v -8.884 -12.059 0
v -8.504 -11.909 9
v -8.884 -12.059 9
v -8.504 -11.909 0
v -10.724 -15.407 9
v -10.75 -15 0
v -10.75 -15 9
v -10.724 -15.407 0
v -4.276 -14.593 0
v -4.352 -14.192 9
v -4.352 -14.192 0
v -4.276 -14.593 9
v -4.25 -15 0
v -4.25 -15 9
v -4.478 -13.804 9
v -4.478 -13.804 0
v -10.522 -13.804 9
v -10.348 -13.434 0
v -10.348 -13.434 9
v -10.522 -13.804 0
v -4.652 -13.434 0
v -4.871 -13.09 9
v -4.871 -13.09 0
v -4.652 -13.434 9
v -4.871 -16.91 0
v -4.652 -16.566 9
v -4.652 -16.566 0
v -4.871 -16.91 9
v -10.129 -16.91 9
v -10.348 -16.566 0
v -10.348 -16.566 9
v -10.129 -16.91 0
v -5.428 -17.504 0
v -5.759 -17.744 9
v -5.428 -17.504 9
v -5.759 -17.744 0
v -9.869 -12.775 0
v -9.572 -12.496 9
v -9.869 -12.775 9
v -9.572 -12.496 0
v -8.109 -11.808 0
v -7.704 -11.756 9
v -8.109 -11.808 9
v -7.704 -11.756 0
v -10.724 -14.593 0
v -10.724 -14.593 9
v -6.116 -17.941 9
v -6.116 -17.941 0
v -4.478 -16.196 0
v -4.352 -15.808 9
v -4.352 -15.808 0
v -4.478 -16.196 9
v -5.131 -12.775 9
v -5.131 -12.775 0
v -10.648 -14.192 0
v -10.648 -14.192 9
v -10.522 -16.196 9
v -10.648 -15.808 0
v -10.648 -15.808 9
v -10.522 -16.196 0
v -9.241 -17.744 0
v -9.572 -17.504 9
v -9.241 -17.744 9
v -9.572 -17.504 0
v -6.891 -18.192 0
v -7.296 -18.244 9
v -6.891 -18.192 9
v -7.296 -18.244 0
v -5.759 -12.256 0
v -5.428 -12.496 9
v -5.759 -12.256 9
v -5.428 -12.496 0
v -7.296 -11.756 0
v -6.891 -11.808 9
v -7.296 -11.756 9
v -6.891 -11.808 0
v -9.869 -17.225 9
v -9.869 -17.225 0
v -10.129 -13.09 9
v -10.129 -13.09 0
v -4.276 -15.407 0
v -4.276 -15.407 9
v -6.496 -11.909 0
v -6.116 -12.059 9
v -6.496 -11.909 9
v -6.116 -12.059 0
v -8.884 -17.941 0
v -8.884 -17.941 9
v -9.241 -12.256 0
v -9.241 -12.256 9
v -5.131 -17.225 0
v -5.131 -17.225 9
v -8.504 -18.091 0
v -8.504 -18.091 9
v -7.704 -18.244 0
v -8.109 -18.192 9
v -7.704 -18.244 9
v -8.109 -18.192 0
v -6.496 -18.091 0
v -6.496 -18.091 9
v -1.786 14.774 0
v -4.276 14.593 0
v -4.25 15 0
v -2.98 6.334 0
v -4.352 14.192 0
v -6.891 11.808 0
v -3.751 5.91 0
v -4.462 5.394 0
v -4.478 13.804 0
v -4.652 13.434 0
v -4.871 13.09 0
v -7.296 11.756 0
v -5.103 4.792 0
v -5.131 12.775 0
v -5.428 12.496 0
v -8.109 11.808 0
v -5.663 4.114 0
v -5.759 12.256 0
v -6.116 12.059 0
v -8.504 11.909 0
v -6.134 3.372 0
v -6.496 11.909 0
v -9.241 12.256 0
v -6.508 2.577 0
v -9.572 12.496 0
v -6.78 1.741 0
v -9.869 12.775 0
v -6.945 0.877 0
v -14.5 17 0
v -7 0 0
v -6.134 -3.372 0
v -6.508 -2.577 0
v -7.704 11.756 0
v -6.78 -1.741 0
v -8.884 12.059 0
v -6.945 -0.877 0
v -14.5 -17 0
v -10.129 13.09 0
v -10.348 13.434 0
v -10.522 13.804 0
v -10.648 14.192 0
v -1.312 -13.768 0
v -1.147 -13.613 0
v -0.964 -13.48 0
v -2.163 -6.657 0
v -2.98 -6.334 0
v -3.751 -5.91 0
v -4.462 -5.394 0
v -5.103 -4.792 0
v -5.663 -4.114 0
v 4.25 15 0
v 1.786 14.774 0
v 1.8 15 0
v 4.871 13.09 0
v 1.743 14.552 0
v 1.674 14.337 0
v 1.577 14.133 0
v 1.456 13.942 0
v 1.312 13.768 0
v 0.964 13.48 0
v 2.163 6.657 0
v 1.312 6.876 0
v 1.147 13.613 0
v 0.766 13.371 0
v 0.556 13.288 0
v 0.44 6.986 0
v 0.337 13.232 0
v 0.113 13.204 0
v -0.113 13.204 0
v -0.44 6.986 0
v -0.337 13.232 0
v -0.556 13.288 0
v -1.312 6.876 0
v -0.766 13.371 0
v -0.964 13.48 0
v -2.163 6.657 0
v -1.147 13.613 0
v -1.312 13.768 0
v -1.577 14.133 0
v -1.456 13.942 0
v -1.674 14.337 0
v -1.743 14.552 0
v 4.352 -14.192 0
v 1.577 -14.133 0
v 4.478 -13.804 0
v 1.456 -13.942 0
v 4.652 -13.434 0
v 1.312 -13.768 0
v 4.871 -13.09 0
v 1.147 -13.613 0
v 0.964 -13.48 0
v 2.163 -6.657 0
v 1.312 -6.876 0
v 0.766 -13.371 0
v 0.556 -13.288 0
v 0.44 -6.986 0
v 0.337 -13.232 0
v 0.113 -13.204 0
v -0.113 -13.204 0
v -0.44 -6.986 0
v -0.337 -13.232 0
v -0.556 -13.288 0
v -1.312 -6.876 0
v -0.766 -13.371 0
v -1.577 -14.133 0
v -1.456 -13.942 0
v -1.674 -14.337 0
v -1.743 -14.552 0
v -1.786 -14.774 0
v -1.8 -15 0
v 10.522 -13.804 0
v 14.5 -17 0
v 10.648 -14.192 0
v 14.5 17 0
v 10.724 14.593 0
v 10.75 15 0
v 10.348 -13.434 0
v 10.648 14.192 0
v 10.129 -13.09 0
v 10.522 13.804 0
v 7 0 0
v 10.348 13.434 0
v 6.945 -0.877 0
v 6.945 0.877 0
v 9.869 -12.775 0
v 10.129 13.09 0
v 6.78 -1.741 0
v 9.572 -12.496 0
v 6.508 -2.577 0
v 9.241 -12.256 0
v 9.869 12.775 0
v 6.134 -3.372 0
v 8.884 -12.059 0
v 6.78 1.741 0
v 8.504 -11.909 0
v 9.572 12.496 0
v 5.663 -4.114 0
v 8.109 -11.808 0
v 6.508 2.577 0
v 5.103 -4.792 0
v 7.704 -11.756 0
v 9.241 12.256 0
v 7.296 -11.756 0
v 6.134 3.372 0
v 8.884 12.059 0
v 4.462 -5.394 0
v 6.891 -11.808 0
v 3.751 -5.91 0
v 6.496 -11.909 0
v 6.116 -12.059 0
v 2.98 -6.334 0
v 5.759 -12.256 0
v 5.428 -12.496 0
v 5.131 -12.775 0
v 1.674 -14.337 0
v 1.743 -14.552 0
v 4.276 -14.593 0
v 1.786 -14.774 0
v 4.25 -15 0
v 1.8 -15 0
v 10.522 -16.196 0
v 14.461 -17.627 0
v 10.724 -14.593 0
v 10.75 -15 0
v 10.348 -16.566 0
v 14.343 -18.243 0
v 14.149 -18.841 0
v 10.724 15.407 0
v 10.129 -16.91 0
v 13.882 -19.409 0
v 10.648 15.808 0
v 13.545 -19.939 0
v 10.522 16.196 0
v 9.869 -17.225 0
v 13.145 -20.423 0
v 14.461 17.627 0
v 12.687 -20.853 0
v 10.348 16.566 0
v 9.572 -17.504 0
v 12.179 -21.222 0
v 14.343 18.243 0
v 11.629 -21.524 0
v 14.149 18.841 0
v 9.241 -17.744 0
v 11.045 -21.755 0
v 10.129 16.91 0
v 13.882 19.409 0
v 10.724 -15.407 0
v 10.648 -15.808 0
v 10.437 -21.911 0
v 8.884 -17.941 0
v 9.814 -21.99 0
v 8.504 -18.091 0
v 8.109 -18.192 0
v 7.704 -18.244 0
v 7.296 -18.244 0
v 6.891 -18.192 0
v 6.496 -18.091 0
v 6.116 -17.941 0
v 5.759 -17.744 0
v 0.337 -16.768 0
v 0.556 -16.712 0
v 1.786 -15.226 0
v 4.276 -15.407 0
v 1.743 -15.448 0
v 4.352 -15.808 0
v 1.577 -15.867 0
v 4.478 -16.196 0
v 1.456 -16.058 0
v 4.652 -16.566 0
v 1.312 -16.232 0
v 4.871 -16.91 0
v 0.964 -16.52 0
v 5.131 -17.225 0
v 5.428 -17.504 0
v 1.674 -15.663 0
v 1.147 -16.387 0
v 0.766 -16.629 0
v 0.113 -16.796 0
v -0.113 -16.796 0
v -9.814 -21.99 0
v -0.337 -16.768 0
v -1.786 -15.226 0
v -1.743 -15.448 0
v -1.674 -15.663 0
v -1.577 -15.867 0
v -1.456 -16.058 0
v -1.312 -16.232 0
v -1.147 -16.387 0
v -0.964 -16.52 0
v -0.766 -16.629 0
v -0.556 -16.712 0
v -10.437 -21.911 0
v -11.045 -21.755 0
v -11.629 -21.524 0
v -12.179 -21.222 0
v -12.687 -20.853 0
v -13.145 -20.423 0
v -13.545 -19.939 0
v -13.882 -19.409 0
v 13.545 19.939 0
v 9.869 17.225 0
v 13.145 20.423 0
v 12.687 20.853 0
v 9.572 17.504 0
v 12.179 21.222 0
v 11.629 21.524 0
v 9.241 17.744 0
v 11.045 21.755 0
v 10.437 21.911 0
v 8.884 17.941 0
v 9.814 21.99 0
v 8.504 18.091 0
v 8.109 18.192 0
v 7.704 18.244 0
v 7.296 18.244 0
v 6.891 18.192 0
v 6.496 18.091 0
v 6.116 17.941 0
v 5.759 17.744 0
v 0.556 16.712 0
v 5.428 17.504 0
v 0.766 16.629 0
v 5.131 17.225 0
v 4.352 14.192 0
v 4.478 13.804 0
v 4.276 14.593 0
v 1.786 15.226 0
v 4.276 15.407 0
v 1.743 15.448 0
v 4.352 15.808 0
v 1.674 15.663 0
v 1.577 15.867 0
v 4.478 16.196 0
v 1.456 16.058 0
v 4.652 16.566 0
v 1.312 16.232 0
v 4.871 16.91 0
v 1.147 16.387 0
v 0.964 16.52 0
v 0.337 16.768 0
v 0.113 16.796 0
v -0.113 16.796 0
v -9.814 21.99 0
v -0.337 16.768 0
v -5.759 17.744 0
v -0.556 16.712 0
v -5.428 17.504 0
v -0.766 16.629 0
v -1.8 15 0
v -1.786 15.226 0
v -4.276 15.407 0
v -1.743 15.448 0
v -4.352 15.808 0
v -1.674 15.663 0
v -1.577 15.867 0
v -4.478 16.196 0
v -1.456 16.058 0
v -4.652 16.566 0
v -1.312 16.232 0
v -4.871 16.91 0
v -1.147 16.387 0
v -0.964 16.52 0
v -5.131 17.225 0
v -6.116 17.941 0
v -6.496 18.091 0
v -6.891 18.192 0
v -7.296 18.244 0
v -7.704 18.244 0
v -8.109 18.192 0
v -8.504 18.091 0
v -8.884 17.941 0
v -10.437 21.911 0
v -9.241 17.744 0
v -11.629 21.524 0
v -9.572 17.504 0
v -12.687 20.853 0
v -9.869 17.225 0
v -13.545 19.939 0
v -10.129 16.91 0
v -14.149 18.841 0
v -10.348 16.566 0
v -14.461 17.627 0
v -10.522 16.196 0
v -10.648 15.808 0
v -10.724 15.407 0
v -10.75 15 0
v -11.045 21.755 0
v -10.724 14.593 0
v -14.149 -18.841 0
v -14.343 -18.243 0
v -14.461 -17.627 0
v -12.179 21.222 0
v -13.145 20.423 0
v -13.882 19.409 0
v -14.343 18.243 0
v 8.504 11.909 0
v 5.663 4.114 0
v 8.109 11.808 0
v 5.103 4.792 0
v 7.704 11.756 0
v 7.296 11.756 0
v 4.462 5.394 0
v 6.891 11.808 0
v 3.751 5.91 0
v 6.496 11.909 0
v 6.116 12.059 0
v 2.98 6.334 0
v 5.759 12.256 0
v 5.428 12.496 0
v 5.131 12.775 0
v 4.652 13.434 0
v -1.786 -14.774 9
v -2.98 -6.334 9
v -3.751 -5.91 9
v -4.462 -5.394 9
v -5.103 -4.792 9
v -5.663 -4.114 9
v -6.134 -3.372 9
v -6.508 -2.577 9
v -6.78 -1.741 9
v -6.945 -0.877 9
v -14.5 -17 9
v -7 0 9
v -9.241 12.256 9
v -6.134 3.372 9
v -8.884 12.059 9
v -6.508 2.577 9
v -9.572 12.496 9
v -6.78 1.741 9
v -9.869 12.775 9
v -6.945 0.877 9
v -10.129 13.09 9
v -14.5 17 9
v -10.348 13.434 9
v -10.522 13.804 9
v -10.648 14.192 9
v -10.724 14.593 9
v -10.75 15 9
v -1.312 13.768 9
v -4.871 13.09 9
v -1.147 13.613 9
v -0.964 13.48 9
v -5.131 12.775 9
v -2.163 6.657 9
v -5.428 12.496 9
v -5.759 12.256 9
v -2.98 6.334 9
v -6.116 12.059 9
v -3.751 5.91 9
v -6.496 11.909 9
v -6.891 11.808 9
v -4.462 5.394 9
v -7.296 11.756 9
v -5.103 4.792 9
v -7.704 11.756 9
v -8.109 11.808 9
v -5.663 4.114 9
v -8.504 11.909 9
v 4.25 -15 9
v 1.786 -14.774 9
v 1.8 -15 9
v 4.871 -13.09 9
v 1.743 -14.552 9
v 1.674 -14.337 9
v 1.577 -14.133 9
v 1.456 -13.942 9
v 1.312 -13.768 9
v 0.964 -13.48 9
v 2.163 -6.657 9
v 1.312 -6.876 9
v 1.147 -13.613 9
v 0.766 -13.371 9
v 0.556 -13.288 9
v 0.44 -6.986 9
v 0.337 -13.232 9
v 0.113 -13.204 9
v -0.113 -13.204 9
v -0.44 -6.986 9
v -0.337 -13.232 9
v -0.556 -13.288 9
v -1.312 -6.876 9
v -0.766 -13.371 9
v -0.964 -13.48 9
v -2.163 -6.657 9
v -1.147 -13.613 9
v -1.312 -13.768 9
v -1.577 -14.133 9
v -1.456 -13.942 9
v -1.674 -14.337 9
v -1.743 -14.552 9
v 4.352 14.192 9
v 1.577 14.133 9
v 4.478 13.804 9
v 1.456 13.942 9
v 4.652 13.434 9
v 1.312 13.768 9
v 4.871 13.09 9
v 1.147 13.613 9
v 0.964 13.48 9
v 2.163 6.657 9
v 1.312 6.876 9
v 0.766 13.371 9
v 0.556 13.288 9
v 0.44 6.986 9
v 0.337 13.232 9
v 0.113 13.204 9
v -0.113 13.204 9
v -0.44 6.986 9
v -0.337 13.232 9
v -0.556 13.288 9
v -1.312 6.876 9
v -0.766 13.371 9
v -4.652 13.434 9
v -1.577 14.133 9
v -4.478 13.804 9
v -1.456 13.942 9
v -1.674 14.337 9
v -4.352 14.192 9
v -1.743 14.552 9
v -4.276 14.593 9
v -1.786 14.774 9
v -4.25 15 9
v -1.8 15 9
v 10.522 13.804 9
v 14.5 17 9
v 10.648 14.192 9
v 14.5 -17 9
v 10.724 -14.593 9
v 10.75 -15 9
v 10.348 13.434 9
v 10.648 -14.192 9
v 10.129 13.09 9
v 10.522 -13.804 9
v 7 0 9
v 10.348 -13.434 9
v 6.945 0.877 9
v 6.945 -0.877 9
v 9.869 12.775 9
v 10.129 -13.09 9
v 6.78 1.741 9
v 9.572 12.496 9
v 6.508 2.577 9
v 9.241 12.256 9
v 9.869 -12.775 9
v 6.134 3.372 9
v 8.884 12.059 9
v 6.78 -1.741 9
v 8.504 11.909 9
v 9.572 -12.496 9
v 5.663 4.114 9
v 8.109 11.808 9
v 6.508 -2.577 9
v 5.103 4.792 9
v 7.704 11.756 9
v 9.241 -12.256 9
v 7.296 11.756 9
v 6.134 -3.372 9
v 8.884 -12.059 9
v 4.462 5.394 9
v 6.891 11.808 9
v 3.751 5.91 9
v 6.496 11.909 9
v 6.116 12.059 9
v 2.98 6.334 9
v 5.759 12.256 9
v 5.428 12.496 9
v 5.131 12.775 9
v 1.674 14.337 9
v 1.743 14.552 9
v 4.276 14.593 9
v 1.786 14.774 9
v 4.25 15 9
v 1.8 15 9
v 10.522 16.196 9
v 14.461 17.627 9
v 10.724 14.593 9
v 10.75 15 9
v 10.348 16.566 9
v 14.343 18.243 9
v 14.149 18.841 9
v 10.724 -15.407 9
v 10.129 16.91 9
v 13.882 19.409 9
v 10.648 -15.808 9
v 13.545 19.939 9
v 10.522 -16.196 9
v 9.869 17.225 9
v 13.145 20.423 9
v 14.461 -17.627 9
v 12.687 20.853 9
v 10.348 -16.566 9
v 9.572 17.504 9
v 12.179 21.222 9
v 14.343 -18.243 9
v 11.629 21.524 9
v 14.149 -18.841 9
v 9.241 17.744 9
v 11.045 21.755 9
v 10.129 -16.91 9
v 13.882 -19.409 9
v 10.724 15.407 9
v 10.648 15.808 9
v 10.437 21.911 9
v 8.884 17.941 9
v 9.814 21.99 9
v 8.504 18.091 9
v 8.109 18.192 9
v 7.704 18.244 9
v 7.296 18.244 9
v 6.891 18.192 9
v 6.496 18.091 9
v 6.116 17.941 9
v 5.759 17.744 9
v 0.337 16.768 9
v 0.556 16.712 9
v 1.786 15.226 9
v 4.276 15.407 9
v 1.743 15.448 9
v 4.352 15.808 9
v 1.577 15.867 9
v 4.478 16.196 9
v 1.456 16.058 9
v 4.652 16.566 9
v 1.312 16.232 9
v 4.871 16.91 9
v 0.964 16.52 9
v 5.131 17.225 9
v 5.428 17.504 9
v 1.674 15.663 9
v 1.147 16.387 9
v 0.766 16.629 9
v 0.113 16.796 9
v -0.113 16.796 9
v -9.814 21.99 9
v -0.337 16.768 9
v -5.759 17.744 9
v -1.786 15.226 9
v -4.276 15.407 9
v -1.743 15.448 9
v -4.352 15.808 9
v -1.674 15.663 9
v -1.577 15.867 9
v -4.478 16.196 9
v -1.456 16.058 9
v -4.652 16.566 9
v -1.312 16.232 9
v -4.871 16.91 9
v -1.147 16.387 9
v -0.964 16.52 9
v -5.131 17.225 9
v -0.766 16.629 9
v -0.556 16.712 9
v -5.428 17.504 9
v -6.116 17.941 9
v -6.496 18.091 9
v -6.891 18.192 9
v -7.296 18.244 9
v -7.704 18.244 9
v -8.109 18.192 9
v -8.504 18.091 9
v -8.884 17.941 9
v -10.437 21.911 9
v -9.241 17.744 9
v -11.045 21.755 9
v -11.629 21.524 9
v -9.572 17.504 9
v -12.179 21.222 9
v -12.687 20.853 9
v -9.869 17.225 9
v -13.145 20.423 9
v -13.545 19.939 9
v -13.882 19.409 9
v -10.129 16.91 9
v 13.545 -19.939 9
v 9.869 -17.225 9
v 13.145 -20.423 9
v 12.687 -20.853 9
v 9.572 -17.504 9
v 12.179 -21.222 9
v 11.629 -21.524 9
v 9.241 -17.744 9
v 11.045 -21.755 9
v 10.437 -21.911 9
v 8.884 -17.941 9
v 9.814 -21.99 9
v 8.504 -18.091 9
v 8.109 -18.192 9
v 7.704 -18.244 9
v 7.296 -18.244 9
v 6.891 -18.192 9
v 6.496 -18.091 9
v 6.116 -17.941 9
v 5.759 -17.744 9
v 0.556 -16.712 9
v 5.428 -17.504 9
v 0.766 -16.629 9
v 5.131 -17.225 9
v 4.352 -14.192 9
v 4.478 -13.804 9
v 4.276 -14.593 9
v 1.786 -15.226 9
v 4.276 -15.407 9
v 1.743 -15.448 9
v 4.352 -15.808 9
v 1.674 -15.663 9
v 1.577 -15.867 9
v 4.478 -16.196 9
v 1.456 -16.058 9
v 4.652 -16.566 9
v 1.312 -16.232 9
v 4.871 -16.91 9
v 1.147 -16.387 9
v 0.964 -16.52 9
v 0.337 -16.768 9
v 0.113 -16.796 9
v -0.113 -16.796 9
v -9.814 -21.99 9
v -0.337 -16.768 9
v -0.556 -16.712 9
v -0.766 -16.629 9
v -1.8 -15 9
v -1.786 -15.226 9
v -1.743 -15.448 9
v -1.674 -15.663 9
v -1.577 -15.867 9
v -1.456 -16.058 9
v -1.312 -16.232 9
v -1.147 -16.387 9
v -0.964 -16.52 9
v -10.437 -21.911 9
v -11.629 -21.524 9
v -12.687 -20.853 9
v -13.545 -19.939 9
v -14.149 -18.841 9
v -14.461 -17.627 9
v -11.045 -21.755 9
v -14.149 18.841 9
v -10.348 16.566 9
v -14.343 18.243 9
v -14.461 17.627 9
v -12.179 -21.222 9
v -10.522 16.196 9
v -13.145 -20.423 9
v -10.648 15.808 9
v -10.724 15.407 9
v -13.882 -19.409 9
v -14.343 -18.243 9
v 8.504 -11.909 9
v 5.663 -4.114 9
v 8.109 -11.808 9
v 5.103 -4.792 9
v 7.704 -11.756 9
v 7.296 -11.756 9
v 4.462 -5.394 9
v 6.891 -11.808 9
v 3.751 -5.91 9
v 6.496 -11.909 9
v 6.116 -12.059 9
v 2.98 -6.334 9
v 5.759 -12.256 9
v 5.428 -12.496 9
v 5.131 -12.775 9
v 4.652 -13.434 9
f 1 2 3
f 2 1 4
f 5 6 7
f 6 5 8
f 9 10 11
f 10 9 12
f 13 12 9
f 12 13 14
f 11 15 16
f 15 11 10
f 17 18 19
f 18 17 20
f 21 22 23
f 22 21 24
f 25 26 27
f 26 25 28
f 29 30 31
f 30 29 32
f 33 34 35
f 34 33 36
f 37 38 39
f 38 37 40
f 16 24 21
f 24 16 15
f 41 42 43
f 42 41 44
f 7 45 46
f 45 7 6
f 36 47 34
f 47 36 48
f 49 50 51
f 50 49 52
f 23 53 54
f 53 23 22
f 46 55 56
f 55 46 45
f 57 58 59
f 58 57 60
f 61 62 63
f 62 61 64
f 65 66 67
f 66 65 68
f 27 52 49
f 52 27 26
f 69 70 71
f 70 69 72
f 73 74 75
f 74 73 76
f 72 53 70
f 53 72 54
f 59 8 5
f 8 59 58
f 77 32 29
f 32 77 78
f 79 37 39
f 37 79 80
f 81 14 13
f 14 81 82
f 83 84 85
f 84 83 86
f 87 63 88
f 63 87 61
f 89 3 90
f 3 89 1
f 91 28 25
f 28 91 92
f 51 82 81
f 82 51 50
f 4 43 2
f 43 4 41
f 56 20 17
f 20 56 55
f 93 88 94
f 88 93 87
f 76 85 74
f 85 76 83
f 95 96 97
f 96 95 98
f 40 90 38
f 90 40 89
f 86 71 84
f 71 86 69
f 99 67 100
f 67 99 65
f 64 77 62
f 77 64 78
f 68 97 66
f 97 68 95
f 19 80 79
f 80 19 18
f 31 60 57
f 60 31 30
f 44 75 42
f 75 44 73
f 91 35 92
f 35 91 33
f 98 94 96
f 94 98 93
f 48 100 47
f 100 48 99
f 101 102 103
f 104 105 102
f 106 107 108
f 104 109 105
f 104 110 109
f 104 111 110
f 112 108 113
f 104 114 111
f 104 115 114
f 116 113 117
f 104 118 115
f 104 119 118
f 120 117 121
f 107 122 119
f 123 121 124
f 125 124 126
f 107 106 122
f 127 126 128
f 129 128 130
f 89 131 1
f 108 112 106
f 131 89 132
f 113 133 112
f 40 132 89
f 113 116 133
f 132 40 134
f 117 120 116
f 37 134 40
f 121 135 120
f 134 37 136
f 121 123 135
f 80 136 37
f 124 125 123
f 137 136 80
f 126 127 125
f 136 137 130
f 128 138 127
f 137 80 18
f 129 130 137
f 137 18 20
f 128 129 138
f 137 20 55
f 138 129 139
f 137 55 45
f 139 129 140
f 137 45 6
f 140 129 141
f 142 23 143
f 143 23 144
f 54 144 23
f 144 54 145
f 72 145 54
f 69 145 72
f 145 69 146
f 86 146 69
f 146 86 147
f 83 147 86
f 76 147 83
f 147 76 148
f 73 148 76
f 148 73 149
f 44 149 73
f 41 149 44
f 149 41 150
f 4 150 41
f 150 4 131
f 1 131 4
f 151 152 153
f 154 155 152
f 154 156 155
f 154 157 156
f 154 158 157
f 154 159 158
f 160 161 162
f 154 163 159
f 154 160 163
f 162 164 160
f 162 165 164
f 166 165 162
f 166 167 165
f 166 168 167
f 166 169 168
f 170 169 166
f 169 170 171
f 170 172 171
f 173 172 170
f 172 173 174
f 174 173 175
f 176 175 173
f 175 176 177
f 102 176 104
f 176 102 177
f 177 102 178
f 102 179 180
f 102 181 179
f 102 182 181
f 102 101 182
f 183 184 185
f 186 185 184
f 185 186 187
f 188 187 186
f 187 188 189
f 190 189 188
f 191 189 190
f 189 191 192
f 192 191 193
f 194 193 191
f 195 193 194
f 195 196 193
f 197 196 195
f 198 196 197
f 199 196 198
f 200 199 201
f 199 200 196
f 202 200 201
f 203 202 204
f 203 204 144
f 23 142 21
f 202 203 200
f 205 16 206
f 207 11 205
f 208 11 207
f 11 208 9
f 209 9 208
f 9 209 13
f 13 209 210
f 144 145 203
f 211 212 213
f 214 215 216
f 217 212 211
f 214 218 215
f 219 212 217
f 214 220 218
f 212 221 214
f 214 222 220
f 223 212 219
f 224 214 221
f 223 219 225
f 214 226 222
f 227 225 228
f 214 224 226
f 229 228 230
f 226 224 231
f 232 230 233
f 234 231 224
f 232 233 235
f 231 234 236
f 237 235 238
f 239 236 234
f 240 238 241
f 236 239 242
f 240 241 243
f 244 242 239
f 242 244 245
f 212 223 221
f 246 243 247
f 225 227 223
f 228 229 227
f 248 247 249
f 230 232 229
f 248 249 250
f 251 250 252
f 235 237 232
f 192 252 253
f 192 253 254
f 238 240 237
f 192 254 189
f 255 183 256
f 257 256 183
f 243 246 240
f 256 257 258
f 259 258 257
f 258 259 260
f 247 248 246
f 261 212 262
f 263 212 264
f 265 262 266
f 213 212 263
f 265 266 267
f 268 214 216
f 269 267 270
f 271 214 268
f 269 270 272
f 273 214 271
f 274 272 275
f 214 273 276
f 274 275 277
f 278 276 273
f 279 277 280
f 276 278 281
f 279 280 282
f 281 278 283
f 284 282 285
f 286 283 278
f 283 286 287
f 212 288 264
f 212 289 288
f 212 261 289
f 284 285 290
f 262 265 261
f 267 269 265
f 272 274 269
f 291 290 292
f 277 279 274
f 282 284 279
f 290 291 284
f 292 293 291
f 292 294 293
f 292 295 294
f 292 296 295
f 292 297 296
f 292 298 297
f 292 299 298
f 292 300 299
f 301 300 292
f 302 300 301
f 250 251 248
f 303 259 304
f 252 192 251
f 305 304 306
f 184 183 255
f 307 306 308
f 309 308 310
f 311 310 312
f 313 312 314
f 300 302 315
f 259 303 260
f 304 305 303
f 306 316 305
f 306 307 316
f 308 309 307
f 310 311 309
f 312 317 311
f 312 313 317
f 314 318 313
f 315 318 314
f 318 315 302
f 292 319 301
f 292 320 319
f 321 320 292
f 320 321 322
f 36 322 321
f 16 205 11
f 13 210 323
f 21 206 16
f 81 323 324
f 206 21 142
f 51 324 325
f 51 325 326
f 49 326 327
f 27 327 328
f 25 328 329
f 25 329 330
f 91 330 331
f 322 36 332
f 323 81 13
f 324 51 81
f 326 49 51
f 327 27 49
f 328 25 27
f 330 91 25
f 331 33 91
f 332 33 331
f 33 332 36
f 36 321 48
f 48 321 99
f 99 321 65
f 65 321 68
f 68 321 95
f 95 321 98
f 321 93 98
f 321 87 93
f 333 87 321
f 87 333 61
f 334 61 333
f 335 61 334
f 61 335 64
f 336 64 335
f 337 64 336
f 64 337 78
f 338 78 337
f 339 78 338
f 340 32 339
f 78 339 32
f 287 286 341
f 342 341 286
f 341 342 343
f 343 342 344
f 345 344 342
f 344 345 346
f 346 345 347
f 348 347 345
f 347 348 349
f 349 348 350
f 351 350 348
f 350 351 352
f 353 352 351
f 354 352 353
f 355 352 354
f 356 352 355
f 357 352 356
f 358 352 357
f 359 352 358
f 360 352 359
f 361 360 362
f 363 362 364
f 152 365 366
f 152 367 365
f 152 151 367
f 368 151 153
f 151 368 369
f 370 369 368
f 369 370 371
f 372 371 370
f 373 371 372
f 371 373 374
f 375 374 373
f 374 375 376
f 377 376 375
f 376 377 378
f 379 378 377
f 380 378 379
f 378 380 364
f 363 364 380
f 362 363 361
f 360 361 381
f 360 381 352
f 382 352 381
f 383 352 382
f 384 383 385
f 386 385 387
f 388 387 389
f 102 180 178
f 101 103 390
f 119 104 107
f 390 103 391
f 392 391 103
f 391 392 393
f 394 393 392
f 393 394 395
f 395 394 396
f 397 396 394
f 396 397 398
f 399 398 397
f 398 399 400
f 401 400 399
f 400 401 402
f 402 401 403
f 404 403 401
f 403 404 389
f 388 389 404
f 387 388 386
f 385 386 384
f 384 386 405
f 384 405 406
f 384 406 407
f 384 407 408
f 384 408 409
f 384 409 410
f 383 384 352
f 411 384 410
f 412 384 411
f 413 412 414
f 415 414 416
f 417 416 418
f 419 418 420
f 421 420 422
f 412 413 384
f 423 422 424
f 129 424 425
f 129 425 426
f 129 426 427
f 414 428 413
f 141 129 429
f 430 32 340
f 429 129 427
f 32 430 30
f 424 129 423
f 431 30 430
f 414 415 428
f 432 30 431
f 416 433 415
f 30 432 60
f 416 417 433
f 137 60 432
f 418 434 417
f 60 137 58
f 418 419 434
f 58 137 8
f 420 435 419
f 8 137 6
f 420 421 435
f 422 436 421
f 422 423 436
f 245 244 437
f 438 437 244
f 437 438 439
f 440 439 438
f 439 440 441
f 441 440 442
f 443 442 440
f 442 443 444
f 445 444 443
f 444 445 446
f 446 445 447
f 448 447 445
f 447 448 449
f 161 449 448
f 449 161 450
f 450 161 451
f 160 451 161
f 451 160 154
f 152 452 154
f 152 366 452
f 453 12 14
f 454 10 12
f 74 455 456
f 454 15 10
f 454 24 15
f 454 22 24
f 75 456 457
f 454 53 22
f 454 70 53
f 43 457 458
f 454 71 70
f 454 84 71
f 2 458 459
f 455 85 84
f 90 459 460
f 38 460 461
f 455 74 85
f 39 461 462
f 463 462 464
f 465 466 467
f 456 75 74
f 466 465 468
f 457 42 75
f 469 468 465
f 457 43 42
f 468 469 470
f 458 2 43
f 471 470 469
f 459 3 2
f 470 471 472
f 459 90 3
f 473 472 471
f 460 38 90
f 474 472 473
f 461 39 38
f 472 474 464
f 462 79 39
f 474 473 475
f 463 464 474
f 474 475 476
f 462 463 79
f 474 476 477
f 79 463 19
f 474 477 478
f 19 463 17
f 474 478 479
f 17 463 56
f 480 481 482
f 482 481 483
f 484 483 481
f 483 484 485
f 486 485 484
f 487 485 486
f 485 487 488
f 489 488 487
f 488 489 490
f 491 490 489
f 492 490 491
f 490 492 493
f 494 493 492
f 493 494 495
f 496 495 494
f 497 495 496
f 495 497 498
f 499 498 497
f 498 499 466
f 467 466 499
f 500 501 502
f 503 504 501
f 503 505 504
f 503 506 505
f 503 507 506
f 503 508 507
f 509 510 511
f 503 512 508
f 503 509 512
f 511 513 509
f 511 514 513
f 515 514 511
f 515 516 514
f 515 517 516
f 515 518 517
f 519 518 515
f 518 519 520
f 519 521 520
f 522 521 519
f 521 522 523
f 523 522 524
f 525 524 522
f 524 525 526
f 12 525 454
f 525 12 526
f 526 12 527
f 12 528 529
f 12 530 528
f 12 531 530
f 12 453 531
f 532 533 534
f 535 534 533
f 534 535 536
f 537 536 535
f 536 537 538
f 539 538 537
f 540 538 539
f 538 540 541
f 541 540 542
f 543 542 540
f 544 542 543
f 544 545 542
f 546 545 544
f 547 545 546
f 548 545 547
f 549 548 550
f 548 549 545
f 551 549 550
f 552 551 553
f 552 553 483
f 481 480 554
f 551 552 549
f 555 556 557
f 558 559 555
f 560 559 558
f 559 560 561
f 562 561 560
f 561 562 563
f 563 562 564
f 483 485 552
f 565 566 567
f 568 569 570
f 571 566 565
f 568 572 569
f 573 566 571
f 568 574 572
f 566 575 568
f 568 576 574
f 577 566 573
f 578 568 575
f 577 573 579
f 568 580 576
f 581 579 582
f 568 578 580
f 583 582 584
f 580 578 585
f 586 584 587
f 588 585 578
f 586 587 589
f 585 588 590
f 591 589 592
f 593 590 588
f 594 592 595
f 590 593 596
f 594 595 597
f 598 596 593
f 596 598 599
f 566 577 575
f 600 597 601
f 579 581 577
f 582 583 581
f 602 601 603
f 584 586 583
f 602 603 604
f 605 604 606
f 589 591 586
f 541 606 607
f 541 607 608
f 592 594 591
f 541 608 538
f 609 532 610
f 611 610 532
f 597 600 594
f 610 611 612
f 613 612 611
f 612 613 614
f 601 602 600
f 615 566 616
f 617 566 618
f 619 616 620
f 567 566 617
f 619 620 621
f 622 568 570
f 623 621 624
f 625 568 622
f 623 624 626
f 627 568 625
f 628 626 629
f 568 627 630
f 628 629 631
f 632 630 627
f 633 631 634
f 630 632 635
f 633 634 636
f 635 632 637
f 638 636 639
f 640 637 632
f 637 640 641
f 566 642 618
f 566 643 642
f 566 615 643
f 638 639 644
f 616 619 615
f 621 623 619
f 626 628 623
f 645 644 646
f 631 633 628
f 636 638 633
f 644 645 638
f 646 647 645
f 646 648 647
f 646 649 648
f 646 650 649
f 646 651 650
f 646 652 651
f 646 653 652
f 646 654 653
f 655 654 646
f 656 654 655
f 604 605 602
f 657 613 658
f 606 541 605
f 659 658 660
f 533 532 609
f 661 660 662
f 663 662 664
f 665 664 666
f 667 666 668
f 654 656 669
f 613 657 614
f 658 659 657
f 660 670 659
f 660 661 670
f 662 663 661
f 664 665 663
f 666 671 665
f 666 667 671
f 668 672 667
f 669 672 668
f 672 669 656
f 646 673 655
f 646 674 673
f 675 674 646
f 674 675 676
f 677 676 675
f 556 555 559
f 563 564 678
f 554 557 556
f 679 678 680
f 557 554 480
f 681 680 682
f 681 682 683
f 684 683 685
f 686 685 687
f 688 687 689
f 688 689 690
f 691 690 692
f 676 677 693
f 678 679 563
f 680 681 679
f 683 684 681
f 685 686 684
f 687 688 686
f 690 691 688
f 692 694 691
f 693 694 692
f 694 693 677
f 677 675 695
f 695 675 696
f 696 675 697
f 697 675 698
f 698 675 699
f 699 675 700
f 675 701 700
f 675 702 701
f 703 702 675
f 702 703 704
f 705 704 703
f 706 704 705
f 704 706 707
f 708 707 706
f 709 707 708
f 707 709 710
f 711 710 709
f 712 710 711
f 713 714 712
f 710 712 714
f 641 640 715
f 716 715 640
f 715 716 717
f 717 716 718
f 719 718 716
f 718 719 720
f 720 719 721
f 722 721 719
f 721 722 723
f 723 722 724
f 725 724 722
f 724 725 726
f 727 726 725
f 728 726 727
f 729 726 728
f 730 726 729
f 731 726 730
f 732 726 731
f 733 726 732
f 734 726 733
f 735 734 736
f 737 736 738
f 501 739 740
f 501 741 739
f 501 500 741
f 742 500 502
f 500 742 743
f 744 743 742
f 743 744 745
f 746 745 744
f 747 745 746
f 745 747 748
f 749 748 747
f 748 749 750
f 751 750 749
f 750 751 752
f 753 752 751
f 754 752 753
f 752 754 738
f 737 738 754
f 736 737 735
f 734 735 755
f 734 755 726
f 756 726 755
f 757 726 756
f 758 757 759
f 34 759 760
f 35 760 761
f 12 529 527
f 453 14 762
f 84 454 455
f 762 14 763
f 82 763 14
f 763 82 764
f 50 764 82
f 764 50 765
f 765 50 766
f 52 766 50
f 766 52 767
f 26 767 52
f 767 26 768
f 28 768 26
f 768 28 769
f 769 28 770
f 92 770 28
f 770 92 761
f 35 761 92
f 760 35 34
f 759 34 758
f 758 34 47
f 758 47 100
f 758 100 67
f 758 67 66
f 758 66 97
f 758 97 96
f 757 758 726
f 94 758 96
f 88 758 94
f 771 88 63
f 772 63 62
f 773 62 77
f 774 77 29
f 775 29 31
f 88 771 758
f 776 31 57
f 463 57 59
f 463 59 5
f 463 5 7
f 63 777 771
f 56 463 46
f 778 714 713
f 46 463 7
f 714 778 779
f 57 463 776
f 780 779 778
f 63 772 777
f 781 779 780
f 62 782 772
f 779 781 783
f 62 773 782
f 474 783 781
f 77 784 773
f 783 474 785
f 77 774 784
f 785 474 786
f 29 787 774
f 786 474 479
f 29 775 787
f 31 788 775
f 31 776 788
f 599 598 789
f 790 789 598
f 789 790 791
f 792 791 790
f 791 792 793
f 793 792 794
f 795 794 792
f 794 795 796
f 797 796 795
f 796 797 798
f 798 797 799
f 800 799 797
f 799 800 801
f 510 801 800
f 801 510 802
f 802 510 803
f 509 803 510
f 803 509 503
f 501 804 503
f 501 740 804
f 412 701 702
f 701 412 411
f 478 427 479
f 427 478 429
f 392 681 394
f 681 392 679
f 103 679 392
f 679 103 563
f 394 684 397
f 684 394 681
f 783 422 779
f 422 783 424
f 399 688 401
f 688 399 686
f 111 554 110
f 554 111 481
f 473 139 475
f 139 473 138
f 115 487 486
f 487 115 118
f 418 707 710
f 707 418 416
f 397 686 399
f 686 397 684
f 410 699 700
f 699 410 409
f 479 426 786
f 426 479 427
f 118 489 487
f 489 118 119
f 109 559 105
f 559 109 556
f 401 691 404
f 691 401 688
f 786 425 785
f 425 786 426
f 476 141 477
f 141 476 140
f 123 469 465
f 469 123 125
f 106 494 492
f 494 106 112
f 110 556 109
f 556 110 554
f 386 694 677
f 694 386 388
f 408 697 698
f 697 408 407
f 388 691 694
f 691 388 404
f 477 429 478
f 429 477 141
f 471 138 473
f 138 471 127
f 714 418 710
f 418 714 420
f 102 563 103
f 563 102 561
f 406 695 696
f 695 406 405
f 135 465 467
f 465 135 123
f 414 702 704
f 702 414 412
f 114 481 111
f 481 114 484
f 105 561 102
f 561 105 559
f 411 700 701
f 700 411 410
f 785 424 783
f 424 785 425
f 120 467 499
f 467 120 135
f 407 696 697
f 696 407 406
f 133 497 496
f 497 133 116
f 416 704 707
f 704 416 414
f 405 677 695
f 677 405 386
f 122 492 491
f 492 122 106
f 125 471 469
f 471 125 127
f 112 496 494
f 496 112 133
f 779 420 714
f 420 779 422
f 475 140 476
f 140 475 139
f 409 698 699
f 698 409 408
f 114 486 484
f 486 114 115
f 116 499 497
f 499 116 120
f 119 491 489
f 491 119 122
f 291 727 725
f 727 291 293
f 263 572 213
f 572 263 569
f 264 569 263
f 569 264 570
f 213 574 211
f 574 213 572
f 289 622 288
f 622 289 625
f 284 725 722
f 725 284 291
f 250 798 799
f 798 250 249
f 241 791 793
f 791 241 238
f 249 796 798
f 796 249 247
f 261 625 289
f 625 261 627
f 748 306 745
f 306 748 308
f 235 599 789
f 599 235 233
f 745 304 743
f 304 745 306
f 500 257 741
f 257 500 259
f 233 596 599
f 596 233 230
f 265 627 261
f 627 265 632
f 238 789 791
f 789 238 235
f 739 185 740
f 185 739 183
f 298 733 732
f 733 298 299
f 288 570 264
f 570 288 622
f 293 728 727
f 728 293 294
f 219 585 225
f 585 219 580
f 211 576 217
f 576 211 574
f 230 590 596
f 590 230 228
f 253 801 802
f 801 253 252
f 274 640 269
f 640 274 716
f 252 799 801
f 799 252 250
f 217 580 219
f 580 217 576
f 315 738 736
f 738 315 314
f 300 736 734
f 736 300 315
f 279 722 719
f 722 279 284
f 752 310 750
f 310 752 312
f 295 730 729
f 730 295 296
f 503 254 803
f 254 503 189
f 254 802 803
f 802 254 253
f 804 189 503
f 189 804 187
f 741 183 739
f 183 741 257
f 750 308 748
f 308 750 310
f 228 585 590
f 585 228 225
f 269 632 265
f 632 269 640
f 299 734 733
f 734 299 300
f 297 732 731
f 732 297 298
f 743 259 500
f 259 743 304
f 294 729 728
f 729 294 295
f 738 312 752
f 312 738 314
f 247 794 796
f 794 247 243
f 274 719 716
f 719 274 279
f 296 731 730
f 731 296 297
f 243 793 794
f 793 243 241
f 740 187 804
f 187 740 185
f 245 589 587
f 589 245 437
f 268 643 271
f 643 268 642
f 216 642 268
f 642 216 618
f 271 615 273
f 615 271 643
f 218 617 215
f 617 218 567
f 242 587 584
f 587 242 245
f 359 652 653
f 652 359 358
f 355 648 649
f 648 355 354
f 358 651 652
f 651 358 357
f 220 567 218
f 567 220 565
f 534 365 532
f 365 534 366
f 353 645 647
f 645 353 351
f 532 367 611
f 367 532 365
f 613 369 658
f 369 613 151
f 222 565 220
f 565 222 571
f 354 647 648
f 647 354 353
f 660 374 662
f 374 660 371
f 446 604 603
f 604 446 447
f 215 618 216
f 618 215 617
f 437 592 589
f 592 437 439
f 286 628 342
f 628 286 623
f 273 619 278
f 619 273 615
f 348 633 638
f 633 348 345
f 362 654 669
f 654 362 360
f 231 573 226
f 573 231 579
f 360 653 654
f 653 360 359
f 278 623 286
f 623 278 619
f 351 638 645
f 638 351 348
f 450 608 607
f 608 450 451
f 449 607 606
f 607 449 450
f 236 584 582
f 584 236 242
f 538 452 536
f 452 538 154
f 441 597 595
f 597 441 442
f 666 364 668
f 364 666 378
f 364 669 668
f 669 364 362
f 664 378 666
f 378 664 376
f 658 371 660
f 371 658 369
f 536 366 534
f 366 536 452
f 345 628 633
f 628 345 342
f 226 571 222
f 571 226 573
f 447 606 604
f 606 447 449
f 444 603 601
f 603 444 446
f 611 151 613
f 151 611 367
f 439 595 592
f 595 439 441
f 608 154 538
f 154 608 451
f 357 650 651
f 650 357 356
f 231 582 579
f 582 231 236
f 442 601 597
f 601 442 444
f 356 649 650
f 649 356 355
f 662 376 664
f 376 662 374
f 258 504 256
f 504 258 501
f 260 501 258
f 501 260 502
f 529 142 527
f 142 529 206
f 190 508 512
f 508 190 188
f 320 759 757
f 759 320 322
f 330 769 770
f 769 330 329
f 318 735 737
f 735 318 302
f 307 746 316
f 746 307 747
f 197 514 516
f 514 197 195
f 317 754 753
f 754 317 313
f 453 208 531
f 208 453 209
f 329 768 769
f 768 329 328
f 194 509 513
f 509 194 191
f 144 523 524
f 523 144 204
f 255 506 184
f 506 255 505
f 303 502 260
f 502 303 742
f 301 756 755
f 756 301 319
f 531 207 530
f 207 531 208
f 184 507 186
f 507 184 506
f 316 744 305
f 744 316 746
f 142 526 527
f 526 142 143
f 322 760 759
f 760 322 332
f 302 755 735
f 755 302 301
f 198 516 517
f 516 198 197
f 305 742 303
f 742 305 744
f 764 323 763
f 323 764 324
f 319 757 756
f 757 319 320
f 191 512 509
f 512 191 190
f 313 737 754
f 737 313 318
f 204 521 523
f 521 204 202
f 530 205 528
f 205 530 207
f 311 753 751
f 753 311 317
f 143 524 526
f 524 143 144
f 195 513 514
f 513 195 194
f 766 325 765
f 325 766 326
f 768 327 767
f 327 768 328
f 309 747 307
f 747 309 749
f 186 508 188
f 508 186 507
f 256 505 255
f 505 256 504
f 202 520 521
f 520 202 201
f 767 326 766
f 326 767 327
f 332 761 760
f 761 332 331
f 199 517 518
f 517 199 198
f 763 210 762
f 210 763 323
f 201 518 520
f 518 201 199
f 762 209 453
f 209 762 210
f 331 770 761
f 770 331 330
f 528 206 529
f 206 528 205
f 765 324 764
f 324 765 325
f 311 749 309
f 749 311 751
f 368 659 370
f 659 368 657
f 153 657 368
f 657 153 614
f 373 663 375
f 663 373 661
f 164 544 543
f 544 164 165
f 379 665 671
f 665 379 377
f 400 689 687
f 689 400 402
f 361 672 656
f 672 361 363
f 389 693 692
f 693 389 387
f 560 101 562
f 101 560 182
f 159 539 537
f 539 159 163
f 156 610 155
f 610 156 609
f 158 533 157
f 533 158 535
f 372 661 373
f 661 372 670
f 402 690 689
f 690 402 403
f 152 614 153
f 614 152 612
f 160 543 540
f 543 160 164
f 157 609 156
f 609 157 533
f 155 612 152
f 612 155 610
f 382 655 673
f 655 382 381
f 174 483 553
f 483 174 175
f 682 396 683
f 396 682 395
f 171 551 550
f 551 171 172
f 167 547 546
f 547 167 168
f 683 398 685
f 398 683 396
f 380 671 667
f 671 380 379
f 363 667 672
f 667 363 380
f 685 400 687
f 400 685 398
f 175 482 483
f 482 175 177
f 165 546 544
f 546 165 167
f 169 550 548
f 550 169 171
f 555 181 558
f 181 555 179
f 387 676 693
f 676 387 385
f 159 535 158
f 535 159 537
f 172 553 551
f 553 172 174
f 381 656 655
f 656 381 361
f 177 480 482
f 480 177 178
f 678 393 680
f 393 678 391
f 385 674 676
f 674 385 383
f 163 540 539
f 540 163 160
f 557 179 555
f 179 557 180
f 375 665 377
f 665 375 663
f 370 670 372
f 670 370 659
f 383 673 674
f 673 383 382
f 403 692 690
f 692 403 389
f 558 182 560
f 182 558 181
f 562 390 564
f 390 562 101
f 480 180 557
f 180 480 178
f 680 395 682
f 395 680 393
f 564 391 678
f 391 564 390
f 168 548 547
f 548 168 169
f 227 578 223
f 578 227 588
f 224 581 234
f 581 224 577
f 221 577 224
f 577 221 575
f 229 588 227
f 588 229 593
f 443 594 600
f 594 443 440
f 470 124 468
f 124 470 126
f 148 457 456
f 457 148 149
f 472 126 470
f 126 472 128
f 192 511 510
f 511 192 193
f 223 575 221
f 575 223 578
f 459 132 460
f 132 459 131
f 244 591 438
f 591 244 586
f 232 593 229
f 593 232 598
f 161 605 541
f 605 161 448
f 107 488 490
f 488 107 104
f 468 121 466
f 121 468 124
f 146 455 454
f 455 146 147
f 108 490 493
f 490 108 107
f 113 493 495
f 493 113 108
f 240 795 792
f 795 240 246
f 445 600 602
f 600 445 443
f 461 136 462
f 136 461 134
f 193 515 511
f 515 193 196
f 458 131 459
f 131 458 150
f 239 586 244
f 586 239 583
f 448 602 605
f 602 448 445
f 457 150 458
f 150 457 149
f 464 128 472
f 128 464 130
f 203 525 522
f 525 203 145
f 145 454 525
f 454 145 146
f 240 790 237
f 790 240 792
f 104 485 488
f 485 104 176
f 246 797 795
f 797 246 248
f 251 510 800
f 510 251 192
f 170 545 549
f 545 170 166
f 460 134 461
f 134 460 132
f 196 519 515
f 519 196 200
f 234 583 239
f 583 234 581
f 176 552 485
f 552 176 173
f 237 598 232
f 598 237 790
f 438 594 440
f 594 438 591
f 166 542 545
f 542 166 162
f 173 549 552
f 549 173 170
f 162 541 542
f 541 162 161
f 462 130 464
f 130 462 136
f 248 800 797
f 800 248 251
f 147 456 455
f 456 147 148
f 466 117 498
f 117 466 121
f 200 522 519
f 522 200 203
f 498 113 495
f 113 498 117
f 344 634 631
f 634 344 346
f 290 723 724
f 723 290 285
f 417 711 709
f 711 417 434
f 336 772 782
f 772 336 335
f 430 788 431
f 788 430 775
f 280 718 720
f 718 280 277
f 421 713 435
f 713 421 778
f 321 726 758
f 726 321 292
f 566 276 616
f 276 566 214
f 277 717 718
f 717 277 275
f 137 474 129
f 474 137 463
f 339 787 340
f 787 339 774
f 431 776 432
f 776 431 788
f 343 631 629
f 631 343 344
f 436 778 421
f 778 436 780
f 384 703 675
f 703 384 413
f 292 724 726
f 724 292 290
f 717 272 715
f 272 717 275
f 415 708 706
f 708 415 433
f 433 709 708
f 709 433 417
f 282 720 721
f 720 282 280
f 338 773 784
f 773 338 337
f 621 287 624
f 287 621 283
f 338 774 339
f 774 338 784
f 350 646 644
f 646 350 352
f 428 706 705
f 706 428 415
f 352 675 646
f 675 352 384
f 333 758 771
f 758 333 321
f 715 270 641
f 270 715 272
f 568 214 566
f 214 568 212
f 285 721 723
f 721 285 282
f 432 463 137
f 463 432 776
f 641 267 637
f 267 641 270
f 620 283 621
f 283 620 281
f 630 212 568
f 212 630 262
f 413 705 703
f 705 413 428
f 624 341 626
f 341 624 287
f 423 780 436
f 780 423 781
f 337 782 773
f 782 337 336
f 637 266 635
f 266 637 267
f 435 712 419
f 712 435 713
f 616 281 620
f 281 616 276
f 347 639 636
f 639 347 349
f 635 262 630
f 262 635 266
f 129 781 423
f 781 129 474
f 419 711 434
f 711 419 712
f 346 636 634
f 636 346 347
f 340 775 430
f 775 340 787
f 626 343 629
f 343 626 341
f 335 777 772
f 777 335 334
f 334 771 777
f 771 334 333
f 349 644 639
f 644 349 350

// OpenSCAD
$fn = 50;

difference() {
	union() {
		hull() {
			translate(v = [-9.5, 17.0, 0]) {
				cylinder(h = 9, r = 5);
			}
			translate(v = [9.5, 17.0, 0]) {
				cylinder(h = 9, r = 5);
			}
			translate(v = [-9.5, -17.0, 0]) {
				cylinder(h = 9, r = 5);
			}
			translate(v = [9.5, -17.0, 0]) {
				cylinder(h = 9, r = 5);
			}
		}
	}
	union() {
		translate(v = [-7.5, -15.0, 0]) {
			cylinder(h = 9, r = 3.25);
		}
		translate(v = [-7.5, 15.0, 0]) {
			cylinder(h = 9, r = 3.25);
		}
		translate(v = [7.5, -15.0, 0]) {
			cylinder(h = 9, r = 3.25);
		}
		translate(v = [7.5, 15.0, 0]) {
			cylinder(h = 9, r = 3.25);
		}
		translate(v = [0.0, -15.0, 0]) {
			cylinder(h = 9, r = 1.8);
		}
		translate(v = [0.0, 15.0, 0]) {
			cylinder(h = 9, r = 1.8);
		}
		cylinder(h = 9, r = 7.0);
	}
}
